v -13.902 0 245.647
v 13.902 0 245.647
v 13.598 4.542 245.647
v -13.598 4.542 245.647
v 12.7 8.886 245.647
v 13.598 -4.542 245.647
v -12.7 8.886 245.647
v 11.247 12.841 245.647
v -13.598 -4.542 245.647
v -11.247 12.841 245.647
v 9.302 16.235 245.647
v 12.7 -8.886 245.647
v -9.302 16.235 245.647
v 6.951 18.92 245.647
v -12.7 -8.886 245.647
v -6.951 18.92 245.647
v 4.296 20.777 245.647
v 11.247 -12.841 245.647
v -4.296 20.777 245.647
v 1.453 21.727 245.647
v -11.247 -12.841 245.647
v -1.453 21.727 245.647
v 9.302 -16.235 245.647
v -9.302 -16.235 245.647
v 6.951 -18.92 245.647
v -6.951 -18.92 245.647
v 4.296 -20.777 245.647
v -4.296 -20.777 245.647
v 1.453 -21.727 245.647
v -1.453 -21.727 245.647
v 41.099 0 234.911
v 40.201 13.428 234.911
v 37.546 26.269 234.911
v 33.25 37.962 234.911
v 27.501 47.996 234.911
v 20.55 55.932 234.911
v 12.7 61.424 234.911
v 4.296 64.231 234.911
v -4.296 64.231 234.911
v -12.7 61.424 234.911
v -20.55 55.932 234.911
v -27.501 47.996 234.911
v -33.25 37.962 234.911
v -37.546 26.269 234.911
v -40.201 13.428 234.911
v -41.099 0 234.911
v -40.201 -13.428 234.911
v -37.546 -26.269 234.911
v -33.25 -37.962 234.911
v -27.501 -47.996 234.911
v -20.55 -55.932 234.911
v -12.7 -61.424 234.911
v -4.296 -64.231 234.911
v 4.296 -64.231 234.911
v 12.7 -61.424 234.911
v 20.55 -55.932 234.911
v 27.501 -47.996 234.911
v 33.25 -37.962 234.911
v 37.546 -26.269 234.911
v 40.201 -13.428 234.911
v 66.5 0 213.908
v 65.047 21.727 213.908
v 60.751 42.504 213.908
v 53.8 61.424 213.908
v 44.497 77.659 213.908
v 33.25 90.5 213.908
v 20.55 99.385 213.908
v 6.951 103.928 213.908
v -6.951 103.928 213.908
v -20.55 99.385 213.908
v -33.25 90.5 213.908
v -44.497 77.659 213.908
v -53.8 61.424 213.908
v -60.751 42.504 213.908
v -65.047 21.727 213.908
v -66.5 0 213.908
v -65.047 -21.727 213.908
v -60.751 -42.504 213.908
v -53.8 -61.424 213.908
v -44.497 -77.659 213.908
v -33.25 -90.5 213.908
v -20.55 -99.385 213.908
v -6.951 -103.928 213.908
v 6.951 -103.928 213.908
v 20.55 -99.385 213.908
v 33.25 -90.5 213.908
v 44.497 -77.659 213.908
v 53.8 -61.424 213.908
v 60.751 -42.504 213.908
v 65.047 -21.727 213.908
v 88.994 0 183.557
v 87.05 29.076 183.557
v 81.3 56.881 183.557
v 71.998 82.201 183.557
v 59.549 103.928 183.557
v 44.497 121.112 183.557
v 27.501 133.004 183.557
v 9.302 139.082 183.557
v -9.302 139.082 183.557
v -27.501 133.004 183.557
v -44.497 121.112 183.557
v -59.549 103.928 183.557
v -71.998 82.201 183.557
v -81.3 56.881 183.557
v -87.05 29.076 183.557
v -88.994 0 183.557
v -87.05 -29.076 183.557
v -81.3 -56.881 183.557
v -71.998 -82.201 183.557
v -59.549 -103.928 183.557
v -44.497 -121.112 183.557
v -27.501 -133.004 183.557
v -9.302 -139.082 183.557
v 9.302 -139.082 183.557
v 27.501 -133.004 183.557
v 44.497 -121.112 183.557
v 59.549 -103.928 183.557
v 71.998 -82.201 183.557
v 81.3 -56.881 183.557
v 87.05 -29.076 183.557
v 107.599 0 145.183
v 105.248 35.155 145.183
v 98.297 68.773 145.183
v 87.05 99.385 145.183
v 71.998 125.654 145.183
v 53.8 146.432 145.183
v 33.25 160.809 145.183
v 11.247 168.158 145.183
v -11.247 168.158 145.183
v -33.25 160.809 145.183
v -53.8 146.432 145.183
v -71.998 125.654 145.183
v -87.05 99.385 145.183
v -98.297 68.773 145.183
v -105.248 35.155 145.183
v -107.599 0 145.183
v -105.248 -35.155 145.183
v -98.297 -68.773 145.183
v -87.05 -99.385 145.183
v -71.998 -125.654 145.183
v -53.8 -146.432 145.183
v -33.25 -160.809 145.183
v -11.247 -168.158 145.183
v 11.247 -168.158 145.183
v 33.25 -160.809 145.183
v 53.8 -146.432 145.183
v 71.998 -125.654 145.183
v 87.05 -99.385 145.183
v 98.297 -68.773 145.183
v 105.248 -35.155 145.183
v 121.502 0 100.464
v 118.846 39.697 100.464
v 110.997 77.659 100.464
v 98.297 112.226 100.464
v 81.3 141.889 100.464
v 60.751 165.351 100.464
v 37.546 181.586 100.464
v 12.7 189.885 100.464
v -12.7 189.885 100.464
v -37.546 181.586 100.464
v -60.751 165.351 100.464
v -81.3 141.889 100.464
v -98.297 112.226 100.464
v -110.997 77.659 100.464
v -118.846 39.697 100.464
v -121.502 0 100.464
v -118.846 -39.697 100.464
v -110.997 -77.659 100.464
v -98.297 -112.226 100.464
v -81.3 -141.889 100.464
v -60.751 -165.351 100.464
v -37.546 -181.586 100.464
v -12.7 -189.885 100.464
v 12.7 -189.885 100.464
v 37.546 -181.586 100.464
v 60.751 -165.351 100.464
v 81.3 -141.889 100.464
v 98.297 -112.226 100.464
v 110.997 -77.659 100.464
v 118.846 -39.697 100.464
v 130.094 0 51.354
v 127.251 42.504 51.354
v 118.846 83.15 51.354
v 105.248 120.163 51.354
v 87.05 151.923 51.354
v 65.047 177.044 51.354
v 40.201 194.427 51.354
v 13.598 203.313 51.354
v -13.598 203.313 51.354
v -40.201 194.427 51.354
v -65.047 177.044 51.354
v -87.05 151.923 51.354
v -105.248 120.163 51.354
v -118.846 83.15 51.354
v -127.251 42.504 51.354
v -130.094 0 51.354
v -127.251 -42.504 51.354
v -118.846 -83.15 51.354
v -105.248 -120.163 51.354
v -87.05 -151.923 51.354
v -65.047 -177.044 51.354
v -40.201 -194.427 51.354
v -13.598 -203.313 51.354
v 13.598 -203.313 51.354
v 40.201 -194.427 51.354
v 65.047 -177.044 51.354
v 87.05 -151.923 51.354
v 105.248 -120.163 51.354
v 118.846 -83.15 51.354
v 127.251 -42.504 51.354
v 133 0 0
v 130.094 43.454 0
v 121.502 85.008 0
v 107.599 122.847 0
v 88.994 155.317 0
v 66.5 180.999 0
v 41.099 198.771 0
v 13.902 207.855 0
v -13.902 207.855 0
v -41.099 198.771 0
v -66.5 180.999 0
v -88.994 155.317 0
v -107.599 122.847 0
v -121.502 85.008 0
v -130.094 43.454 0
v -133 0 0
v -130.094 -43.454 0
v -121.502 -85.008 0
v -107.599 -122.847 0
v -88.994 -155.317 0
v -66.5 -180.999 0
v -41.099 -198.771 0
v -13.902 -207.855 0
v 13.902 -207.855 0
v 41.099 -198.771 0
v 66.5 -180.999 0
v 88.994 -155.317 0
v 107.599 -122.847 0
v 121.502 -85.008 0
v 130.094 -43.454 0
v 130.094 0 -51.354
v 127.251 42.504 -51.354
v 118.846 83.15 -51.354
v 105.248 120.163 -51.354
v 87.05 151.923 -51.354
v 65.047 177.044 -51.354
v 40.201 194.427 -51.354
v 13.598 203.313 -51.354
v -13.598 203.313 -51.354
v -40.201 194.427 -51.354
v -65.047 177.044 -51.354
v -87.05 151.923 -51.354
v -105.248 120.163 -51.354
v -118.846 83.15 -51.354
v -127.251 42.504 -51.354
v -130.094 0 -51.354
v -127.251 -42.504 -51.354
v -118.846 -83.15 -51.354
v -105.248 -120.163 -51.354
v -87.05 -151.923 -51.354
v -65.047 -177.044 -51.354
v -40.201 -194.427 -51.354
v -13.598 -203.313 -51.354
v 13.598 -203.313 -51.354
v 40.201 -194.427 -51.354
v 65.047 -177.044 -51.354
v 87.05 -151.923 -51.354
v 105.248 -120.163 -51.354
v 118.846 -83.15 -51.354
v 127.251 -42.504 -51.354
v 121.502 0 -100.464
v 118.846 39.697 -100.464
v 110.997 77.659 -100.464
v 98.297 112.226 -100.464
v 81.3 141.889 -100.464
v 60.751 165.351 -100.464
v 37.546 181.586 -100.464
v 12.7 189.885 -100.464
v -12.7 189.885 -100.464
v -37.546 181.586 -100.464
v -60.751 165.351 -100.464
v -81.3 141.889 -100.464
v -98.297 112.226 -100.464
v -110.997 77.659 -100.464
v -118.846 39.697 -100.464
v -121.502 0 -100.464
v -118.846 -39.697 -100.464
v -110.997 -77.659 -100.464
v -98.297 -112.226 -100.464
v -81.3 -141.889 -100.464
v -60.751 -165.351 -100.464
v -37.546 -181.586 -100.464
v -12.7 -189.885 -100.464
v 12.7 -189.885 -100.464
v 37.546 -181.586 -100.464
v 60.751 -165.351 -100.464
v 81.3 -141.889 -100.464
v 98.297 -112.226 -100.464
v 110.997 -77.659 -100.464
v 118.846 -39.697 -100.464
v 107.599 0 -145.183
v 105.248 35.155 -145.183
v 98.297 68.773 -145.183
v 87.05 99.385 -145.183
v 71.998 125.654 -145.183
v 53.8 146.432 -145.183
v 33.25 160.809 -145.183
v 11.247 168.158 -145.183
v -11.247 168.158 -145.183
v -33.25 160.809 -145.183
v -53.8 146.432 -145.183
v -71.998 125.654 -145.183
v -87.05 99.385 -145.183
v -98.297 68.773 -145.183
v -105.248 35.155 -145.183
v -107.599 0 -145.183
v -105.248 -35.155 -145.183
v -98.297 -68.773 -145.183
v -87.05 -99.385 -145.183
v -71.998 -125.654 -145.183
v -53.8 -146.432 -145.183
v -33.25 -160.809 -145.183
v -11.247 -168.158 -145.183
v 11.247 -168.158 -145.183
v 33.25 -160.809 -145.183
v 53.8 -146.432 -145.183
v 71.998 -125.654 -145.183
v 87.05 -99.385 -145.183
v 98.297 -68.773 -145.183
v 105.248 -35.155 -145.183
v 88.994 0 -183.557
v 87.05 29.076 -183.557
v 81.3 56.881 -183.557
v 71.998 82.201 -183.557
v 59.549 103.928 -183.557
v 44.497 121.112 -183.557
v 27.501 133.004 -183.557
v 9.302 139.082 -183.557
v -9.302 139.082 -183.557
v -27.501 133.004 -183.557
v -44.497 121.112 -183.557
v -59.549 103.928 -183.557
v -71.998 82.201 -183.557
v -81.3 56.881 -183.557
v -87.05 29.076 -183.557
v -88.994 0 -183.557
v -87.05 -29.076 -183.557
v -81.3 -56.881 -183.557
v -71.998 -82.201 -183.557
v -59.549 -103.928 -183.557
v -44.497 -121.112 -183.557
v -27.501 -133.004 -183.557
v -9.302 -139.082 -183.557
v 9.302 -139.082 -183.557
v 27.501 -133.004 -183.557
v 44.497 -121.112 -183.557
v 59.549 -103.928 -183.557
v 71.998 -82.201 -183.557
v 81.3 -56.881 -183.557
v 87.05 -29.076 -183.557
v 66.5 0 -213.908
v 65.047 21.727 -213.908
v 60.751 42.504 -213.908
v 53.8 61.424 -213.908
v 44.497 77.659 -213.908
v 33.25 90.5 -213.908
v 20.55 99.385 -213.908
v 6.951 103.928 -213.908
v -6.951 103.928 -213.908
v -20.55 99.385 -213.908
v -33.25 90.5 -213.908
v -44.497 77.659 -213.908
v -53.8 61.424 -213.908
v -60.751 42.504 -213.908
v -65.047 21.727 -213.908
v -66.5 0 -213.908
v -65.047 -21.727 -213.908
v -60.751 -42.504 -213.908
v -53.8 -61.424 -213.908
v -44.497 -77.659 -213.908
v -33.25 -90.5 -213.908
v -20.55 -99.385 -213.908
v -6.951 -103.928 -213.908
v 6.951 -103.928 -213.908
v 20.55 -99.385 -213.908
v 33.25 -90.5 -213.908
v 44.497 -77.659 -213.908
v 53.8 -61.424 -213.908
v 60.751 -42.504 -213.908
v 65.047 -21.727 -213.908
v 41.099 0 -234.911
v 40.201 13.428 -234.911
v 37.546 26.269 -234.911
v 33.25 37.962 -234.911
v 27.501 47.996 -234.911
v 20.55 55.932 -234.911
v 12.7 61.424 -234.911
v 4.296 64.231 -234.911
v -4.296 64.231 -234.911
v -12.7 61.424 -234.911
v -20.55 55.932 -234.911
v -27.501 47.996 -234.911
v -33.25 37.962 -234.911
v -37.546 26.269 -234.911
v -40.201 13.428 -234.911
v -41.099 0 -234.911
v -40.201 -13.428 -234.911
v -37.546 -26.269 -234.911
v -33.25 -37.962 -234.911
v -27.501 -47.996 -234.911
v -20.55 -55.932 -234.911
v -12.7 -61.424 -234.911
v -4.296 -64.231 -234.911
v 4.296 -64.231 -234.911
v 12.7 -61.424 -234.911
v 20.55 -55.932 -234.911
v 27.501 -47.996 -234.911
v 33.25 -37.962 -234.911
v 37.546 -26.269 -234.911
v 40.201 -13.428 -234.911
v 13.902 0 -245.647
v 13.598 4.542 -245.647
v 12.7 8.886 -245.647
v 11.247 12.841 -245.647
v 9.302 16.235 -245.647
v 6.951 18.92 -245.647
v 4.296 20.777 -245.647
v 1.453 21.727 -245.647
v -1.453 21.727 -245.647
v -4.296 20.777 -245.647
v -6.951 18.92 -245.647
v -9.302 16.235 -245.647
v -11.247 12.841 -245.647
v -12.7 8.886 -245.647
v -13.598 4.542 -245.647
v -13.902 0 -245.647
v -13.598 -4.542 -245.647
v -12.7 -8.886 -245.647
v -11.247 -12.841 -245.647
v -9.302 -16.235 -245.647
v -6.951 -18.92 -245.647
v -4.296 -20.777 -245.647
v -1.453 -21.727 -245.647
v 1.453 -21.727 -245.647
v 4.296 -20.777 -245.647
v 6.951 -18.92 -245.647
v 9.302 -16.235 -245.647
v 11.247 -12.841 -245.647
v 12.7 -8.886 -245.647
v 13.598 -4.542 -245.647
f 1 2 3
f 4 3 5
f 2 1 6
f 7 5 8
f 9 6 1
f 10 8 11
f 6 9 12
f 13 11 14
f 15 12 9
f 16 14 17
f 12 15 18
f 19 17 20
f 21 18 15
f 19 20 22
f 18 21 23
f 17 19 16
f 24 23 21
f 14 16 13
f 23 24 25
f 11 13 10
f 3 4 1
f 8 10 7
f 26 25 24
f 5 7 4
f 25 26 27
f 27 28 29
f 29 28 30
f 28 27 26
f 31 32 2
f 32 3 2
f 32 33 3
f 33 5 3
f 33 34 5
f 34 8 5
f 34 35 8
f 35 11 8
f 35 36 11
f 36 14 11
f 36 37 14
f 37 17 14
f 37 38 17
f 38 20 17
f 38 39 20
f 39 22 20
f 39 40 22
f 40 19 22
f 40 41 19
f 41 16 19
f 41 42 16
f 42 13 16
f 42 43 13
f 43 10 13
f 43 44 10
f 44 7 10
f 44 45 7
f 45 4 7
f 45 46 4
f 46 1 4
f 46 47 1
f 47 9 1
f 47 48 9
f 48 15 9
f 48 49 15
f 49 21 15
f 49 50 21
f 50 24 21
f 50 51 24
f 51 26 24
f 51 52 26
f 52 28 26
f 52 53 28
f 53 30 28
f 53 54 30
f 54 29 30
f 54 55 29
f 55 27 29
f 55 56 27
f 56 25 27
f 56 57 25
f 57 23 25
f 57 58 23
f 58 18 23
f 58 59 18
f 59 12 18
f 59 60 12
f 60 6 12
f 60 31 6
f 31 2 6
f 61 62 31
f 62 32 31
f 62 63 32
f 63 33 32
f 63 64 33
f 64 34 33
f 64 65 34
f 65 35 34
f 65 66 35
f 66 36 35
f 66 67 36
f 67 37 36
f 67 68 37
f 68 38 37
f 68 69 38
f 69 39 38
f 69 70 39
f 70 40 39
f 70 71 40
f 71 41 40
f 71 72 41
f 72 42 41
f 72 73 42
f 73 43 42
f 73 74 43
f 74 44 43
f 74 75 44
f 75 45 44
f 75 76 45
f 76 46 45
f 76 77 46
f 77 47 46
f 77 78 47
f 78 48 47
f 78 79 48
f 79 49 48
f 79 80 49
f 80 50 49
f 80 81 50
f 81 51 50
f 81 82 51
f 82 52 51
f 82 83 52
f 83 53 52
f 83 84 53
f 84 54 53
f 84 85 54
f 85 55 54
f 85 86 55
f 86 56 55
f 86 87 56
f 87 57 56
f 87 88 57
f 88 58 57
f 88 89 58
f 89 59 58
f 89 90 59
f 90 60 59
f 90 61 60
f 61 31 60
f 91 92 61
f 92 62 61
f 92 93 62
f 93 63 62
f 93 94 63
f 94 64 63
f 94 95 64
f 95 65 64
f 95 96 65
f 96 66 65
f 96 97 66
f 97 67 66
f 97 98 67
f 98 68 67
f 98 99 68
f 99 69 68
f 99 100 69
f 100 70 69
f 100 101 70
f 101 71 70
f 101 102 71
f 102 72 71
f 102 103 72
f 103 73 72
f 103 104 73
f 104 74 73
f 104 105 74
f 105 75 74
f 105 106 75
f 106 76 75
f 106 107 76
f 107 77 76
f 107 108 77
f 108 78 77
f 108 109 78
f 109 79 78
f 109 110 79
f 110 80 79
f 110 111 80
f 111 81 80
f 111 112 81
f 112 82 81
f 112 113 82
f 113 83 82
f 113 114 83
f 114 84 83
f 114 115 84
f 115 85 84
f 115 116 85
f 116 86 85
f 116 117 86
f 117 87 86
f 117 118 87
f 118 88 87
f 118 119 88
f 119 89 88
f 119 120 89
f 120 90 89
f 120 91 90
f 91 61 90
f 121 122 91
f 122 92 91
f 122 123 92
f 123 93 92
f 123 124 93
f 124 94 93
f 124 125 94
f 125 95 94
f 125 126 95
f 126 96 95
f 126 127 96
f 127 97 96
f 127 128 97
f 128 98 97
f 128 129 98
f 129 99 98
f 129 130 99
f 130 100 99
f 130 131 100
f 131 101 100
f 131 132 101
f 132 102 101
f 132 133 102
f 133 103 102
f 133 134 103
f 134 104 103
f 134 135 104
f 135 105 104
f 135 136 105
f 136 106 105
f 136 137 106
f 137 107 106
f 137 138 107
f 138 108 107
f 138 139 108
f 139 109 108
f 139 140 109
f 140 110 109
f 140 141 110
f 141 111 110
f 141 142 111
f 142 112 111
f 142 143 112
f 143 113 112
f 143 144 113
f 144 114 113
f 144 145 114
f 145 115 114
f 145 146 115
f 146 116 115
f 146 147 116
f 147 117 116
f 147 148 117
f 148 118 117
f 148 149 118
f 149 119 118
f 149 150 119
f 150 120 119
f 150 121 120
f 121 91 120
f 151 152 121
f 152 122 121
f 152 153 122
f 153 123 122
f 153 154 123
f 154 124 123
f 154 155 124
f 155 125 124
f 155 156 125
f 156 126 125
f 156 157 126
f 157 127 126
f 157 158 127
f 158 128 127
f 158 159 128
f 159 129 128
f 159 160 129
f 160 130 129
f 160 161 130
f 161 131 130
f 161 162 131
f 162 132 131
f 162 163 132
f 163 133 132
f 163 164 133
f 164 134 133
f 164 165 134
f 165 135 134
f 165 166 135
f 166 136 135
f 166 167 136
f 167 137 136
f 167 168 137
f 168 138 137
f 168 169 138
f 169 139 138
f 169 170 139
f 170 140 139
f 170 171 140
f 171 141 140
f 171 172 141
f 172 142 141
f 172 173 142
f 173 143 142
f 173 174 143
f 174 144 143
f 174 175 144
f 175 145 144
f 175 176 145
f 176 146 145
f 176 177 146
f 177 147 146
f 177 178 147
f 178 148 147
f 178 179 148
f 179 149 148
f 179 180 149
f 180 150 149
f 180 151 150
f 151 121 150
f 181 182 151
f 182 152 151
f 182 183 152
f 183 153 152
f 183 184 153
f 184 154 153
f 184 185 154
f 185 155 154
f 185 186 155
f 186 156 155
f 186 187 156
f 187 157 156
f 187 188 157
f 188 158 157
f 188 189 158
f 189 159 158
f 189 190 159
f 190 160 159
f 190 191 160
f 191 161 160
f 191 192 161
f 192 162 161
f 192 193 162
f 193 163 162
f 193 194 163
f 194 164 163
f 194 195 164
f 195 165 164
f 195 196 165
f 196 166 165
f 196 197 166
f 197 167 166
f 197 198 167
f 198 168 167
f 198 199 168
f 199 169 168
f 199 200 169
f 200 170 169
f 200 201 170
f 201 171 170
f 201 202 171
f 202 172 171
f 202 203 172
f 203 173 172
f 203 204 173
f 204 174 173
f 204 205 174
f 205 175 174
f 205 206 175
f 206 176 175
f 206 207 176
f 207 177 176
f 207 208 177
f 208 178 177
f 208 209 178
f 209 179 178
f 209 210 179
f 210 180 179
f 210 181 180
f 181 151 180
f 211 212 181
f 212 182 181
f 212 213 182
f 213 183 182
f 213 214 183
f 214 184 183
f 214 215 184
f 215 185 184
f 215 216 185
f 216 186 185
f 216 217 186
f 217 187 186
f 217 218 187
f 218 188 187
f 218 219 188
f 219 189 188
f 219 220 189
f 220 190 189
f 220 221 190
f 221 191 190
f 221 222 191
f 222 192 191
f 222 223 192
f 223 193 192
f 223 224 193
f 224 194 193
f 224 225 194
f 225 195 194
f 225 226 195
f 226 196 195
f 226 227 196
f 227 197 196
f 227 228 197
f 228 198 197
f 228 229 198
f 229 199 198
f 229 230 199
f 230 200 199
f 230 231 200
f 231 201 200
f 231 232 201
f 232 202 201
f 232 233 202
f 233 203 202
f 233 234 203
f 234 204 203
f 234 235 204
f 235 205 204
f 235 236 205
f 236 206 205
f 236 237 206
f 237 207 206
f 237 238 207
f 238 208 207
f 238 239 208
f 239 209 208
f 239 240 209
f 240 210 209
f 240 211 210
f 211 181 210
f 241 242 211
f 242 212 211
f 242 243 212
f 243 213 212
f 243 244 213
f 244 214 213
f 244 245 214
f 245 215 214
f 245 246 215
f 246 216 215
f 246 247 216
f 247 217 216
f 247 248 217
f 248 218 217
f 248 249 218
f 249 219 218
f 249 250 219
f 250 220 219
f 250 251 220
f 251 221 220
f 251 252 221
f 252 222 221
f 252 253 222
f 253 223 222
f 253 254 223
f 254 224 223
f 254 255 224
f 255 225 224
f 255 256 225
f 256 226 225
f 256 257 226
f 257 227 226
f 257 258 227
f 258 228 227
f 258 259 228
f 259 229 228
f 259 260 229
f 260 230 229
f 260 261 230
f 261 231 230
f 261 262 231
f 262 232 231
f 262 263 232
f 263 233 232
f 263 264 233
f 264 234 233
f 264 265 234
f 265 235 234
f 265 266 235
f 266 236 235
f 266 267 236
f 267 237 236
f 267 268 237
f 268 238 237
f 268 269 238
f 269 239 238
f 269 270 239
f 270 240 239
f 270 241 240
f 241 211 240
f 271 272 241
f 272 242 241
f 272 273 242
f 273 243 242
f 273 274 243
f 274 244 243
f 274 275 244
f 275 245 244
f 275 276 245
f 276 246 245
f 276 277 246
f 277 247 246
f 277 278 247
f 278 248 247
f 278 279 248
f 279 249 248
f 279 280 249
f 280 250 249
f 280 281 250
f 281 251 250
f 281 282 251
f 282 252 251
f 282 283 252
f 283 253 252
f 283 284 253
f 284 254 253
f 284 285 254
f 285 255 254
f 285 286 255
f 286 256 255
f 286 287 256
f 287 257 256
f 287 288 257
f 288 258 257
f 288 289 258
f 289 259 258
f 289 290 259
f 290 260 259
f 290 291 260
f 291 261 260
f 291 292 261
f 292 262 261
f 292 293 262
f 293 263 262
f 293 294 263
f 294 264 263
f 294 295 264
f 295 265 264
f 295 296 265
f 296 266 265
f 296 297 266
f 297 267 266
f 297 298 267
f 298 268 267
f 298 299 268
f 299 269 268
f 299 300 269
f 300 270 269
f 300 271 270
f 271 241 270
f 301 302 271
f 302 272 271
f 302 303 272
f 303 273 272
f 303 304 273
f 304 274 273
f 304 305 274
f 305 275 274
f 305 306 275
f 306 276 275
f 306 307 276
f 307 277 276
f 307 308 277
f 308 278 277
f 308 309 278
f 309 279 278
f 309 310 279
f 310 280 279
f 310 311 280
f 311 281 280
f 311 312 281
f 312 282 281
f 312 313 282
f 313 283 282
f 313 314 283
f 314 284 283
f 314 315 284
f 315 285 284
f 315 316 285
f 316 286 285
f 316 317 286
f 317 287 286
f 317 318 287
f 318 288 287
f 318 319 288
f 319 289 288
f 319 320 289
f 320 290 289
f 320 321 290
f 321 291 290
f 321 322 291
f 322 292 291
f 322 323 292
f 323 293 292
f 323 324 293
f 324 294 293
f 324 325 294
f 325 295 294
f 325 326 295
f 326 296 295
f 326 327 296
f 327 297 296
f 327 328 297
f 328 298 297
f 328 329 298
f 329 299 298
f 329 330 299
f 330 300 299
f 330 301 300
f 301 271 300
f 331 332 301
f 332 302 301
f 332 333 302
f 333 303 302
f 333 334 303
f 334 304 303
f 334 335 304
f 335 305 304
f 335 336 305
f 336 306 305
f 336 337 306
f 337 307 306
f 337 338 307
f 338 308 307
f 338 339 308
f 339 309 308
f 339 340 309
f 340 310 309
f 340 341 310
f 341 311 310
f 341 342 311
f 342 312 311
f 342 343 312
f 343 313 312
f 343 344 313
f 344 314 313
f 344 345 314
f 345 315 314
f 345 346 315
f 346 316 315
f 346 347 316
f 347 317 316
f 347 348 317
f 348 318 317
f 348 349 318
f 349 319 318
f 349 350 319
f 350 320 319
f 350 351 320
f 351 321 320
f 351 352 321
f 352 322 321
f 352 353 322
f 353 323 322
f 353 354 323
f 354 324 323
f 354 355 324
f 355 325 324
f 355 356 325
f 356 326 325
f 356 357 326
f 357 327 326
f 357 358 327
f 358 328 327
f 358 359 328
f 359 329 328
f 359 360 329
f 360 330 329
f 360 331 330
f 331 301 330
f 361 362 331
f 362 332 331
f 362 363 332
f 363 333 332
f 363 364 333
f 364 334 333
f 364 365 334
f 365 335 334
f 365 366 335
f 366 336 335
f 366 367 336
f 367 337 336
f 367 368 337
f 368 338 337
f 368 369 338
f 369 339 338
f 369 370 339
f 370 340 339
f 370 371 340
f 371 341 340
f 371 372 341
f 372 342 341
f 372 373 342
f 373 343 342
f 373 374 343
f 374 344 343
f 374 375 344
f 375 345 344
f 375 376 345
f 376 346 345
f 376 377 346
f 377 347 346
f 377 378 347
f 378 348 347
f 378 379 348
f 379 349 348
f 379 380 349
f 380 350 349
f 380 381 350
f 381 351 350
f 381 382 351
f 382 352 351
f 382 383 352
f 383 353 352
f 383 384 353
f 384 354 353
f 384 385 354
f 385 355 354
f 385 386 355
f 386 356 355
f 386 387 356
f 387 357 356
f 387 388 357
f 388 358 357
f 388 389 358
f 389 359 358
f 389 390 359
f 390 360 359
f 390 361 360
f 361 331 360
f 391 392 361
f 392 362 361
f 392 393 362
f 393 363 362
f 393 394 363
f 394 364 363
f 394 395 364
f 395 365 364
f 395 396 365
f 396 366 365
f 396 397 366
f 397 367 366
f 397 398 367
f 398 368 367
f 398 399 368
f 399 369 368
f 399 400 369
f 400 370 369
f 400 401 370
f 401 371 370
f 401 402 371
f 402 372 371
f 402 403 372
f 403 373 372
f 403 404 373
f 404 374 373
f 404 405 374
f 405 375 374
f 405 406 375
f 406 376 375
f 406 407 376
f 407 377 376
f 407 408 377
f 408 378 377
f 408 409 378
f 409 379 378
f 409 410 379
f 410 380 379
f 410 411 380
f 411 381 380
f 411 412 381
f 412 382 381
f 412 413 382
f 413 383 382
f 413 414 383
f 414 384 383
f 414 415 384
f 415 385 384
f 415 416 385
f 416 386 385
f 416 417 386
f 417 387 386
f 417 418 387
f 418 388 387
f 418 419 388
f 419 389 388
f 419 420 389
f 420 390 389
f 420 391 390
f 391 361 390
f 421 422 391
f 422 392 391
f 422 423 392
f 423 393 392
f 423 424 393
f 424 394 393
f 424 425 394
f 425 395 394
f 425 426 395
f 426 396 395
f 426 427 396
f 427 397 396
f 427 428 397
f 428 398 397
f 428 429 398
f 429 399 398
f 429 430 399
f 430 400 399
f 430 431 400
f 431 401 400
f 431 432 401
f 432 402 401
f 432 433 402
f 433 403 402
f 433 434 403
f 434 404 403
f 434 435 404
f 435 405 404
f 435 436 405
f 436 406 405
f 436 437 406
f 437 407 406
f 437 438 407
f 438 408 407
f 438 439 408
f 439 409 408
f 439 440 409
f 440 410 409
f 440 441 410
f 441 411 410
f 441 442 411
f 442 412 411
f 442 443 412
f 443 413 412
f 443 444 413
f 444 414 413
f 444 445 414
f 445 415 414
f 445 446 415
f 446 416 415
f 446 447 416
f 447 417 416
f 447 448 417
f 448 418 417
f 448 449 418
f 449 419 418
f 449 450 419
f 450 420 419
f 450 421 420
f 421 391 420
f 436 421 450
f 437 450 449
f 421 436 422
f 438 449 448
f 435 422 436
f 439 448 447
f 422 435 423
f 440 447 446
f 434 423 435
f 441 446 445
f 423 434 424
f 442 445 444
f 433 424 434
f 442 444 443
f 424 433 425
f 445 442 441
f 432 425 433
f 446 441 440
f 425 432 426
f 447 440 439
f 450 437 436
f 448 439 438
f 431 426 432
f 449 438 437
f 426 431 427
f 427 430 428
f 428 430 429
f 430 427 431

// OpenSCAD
// Generated by SolidPython 1.0.1 on 2020-07-29 00:39:26


scale(v = [7, 11, 13]) {
	sphere(r = 19);
}
/***********************************************
*********      SolidPython code:      **********
************************************************
 
# import packages: SolidPython
from solid import *
from solid.utils import *
from itertools import chain, combinations


class Resize:

    def __init__(self, scad_file):
        self.scad_file = scad_file
        #self.scad_file = import_scad(scad_file)
        # cone/cylinder param:
        self.r1 = 0
        self.r2 = 0
        self.h = 0
        # rectangular prism param:
        self.w = 0
        self.l = 0
        # ellipse param:
        self.r = 0

    # import OpenScad code (file name corresponds to shape)


    # classify shape + parameters
    def assign(self, param1, param2, param3):
        if self.scad_file == 'cone.scad':
            self.r1 = param1
            self.r2 = param2
            self.h = param3
        elif self.scad_file == 'cylinder.scad':
            self.r1 = param1
            self.r2 = param2
            self.h = param3
        elif self.scad_file == 'rectangularPrism.scad':
            self.h = param1
            self.l = param2
            self.w = param3
        else:
            self.r = param1
            self.h = param2

    # resize parameters
    def iterate(self):
        x = range(3, 20, 2)
        i = 1
        if self.scad_file == 'cone.scad':
            tempList = list(combinations(x, 2))
            for temp in tempList:
                param1 = temp[0]
                param2 = temp[1]
                filepath = 'produced_scad_files/' + 'cone' + str(param1) + '_' + str(param2) + '_' + '.scad'
                scad_render_to_file(cylinder(h=param1, r1=param2, r2=0), filepath)

        elif self.scad_file == 'cylinder.scad':
            tempList = list(combinations(x, 3))
            for temp in tempList:
                param1 = temp[0]
                param2 = temp[1]
                filepath = 'produced_scad_files/' + 'cylinder' + str(param1) + '_' + str(param2) + '_' + '.scad'
                scad_render_to_file(cylinder(h=param1, r1=param2, r2=param2), filepath)

        elif self.scad_file == 'rectangularPrism.scad':
            tempList = list(combinations(x, 3))
            for temp in tempList:
                param1 = temp[0]
                param2 = temp[1]
                param3 = temp[2]
                filepath = 'produced_scad_files/' + 'rectangularPrism' + str(param1) + '_' + str(param2) + '_' + str(
                    param3) + '.scad'
                scad_render_to_file(cube(size=(param1, param2, param3)), filepath)

        elif self.scad_file == 'ellipse.scad':
            tempList = list(combinations(x, 4))
            for temp in tempList:
                param1 = temp[0]
                param2 = temp[1]
                param3 = temp[2]
                param4 = temp[3]
                filepath = 'produced_scad_files/' + 'ellipse' + str(param1) + '_' + str(param2) + '_' + str(param3) + '_' + str(param4) + '.scad'
                scad_render_to_file(scale([param1, param2, param3])(sphere(r=param4)), filepath)

    def render_to_scadfile(self):
        scad_render_to_file(scad, 'example.scad') 
 
************************************************/
